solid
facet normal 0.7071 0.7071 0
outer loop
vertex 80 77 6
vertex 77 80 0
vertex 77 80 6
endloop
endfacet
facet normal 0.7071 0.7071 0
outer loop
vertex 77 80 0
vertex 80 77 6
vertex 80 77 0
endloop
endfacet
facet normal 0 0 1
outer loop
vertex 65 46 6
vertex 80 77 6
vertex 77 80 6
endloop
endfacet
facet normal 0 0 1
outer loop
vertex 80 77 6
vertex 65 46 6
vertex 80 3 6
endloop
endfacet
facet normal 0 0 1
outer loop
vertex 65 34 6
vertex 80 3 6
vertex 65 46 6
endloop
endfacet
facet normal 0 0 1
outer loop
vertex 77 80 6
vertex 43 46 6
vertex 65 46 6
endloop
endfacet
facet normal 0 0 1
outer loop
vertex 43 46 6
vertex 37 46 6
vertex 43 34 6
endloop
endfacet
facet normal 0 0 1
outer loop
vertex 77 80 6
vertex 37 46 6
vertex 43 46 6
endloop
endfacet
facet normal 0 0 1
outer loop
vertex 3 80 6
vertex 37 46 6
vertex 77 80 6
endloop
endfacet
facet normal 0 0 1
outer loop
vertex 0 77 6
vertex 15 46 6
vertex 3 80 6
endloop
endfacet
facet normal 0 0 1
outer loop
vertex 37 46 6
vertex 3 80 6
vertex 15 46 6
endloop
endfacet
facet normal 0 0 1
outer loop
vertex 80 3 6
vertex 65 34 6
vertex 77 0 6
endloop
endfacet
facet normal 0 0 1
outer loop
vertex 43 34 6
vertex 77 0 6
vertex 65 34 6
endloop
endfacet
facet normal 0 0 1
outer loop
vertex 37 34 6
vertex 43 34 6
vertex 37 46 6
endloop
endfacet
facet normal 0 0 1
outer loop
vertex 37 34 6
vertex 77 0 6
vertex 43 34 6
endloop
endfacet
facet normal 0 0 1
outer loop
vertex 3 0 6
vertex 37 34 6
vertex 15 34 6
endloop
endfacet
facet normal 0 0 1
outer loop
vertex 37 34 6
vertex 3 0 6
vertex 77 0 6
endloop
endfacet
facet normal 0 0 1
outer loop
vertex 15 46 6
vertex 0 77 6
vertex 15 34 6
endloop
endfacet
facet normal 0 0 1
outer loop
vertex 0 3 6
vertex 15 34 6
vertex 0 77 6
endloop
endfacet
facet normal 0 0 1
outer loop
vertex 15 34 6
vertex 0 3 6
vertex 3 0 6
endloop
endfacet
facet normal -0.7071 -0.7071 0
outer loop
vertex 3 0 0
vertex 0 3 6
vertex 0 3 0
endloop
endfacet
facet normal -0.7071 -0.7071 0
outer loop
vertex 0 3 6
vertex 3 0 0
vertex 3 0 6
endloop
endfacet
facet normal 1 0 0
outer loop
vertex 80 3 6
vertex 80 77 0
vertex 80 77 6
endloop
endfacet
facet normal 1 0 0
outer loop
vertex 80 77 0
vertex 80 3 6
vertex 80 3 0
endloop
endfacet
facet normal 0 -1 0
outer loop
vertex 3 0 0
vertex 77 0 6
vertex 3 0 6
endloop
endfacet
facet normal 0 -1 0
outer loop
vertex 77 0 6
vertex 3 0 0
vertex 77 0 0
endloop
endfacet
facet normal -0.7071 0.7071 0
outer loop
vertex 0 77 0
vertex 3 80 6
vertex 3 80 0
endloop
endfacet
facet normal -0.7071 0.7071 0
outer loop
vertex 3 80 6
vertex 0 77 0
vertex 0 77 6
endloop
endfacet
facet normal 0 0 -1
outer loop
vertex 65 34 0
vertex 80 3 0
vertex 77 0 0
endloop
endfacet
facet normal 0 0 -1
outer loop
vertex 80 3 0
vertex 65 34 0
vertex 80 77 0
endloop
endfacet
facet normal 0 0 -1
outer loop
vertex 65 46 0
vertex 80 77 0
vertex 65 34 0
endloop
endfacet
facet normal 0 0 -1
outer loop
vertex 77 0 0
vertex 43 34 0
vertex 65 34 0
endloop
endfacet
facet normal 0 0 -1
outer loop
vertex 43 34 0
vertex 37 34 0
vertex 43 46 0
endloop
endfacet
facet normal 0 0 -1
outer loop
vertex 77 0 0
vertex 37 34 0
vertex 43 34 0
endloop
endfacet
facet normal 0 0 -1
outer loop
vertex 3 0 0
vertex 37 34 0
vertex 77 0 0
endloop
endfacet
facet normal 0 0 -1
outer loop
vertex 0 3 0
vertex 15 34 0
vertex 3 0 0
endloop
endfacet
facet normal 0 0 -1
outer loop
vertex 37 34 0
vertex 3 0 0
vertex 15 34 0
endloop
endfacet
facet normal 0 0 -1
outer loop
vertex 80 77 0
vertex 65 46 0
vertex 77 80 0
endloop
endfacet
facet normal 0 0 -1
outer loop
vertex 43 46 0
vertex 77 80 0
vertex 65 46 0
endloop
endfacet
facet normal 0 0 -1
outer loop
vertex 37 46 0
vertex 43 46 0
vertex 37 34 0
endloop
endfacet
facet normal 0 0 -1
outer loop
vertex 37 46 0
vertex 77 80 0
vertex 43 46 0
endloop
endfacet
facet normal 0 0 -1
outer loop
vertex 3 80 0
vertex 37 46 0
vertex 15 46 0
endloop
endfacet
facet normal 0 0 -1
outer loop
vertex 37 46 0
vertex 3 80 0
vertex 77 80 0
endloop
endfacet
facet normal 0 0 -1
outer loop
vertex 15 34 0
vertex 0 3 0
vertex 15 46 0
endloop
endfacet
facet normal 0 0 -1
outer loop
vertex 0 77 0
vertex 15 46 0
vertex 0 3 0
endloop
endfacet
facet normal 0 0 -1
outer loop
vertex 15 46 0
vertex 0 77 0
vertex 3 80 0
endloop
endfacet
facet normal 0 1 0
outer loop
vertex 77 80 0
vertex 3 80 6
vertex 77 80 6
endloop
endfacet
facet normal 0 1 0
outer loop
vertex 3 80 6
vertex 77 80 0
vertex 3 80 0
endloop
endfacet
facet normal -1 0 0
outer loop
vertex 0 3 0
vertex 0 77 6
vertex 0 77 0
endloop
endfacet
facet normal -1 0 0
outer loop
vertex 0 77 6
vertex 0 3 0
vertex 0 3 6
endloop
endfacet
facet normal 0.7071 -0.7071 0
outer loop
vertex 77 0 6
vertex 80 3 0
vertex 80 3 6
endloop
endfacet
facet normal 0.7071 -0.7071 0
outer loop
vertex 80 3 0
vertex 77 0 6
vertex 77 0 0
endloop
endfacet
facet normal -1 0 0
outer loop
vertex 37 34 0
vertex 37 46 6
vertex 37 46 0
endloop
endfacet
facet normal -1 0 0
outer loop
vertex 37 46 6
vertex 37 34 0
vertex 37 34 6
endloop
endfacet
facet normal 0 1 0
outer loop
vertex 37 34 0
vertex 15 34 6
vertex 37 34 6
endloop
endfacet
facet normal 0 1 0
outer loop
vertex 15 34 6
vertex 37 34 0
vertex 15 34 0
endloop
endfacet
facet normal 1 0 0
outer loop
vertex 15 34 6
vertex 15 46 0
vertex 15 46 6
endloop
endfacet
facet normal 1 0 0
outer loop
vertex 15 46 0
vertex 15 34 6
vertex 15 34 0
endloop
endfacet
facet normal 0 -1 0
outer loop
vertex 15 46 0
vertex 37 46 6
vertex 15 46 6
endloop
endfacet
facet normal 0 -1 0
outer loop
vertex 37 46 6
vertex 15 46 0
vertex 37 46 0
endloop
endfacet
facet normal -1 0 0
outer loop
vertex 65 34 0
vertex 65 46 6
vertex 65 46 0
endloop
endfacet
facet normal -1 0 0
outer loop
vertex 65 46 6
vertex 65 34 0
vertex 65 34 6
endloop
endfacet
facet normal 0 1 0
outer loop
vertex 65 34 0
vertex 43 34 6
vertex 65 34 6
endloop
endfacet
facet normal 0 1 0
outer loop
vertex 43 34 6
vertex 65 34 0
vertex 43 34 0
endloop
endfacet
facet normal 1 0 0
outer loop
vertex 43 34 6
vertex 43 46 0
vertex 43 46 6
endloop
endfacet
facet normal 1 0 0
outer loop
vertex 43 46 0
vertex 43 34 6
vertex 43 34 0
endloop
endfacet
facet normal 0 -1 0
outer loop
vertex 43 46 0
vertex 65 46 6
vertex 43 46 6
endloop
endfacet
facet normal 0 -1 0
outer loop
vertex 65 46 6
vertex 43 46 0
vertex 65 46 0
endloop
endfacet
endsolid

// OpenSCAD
$fn = 32;

// ----------------------------------------------------------------------
// Windowed plate: 2 voids, 80 x 80 x 6 mm
// ----------------------------------------------------------------------

// --- parameters (mm) ---
plate_l = 80;             // plate length, X
plate_w = 80;             // plate width, Y
plate_t = 6;              // plate thickness, Z
edge_margin = 12;         // wall from the plate edge to any window
windows = 2;              // number of windows in the row
win_l = 22;               // window length
win_w = 12;               // window width
win_pitch = 28;           // window pitch along X
depth_1 = 6;              // depth of void 1 (full thickness = through)
depth_2 = 6;              // depth of void 2 (full thickness = through)
corner_c = 3;             // corner chamfer of the plate

profile = [[3, 0], [77, 0], [80, 3], [80, 77], [77, 80], [3, 80], [0, 77], [0, 3]];  // primary outline, 8 points, counter clockwise
void_1 = [[15, 34], [37, 34], [37, 46], [15, 46]];  // window 1 of the row, 4 points
void_2 = [[43, 34], [65, 34], [65, 46], [43, 46]];  // window 2 of the row, 4 points

// --- the one profile operation ---
difference() {
  linear_extrude(height = plate_t) polygon(points = profile);
  translate([0, 0, -1])
    linear_extrude(height = plate_t + 2) polygon(points = void_1);
  translate([0, 0, -1])
    linear_extrude(height = plate_t + 2) polygon(points = void_2);
}
